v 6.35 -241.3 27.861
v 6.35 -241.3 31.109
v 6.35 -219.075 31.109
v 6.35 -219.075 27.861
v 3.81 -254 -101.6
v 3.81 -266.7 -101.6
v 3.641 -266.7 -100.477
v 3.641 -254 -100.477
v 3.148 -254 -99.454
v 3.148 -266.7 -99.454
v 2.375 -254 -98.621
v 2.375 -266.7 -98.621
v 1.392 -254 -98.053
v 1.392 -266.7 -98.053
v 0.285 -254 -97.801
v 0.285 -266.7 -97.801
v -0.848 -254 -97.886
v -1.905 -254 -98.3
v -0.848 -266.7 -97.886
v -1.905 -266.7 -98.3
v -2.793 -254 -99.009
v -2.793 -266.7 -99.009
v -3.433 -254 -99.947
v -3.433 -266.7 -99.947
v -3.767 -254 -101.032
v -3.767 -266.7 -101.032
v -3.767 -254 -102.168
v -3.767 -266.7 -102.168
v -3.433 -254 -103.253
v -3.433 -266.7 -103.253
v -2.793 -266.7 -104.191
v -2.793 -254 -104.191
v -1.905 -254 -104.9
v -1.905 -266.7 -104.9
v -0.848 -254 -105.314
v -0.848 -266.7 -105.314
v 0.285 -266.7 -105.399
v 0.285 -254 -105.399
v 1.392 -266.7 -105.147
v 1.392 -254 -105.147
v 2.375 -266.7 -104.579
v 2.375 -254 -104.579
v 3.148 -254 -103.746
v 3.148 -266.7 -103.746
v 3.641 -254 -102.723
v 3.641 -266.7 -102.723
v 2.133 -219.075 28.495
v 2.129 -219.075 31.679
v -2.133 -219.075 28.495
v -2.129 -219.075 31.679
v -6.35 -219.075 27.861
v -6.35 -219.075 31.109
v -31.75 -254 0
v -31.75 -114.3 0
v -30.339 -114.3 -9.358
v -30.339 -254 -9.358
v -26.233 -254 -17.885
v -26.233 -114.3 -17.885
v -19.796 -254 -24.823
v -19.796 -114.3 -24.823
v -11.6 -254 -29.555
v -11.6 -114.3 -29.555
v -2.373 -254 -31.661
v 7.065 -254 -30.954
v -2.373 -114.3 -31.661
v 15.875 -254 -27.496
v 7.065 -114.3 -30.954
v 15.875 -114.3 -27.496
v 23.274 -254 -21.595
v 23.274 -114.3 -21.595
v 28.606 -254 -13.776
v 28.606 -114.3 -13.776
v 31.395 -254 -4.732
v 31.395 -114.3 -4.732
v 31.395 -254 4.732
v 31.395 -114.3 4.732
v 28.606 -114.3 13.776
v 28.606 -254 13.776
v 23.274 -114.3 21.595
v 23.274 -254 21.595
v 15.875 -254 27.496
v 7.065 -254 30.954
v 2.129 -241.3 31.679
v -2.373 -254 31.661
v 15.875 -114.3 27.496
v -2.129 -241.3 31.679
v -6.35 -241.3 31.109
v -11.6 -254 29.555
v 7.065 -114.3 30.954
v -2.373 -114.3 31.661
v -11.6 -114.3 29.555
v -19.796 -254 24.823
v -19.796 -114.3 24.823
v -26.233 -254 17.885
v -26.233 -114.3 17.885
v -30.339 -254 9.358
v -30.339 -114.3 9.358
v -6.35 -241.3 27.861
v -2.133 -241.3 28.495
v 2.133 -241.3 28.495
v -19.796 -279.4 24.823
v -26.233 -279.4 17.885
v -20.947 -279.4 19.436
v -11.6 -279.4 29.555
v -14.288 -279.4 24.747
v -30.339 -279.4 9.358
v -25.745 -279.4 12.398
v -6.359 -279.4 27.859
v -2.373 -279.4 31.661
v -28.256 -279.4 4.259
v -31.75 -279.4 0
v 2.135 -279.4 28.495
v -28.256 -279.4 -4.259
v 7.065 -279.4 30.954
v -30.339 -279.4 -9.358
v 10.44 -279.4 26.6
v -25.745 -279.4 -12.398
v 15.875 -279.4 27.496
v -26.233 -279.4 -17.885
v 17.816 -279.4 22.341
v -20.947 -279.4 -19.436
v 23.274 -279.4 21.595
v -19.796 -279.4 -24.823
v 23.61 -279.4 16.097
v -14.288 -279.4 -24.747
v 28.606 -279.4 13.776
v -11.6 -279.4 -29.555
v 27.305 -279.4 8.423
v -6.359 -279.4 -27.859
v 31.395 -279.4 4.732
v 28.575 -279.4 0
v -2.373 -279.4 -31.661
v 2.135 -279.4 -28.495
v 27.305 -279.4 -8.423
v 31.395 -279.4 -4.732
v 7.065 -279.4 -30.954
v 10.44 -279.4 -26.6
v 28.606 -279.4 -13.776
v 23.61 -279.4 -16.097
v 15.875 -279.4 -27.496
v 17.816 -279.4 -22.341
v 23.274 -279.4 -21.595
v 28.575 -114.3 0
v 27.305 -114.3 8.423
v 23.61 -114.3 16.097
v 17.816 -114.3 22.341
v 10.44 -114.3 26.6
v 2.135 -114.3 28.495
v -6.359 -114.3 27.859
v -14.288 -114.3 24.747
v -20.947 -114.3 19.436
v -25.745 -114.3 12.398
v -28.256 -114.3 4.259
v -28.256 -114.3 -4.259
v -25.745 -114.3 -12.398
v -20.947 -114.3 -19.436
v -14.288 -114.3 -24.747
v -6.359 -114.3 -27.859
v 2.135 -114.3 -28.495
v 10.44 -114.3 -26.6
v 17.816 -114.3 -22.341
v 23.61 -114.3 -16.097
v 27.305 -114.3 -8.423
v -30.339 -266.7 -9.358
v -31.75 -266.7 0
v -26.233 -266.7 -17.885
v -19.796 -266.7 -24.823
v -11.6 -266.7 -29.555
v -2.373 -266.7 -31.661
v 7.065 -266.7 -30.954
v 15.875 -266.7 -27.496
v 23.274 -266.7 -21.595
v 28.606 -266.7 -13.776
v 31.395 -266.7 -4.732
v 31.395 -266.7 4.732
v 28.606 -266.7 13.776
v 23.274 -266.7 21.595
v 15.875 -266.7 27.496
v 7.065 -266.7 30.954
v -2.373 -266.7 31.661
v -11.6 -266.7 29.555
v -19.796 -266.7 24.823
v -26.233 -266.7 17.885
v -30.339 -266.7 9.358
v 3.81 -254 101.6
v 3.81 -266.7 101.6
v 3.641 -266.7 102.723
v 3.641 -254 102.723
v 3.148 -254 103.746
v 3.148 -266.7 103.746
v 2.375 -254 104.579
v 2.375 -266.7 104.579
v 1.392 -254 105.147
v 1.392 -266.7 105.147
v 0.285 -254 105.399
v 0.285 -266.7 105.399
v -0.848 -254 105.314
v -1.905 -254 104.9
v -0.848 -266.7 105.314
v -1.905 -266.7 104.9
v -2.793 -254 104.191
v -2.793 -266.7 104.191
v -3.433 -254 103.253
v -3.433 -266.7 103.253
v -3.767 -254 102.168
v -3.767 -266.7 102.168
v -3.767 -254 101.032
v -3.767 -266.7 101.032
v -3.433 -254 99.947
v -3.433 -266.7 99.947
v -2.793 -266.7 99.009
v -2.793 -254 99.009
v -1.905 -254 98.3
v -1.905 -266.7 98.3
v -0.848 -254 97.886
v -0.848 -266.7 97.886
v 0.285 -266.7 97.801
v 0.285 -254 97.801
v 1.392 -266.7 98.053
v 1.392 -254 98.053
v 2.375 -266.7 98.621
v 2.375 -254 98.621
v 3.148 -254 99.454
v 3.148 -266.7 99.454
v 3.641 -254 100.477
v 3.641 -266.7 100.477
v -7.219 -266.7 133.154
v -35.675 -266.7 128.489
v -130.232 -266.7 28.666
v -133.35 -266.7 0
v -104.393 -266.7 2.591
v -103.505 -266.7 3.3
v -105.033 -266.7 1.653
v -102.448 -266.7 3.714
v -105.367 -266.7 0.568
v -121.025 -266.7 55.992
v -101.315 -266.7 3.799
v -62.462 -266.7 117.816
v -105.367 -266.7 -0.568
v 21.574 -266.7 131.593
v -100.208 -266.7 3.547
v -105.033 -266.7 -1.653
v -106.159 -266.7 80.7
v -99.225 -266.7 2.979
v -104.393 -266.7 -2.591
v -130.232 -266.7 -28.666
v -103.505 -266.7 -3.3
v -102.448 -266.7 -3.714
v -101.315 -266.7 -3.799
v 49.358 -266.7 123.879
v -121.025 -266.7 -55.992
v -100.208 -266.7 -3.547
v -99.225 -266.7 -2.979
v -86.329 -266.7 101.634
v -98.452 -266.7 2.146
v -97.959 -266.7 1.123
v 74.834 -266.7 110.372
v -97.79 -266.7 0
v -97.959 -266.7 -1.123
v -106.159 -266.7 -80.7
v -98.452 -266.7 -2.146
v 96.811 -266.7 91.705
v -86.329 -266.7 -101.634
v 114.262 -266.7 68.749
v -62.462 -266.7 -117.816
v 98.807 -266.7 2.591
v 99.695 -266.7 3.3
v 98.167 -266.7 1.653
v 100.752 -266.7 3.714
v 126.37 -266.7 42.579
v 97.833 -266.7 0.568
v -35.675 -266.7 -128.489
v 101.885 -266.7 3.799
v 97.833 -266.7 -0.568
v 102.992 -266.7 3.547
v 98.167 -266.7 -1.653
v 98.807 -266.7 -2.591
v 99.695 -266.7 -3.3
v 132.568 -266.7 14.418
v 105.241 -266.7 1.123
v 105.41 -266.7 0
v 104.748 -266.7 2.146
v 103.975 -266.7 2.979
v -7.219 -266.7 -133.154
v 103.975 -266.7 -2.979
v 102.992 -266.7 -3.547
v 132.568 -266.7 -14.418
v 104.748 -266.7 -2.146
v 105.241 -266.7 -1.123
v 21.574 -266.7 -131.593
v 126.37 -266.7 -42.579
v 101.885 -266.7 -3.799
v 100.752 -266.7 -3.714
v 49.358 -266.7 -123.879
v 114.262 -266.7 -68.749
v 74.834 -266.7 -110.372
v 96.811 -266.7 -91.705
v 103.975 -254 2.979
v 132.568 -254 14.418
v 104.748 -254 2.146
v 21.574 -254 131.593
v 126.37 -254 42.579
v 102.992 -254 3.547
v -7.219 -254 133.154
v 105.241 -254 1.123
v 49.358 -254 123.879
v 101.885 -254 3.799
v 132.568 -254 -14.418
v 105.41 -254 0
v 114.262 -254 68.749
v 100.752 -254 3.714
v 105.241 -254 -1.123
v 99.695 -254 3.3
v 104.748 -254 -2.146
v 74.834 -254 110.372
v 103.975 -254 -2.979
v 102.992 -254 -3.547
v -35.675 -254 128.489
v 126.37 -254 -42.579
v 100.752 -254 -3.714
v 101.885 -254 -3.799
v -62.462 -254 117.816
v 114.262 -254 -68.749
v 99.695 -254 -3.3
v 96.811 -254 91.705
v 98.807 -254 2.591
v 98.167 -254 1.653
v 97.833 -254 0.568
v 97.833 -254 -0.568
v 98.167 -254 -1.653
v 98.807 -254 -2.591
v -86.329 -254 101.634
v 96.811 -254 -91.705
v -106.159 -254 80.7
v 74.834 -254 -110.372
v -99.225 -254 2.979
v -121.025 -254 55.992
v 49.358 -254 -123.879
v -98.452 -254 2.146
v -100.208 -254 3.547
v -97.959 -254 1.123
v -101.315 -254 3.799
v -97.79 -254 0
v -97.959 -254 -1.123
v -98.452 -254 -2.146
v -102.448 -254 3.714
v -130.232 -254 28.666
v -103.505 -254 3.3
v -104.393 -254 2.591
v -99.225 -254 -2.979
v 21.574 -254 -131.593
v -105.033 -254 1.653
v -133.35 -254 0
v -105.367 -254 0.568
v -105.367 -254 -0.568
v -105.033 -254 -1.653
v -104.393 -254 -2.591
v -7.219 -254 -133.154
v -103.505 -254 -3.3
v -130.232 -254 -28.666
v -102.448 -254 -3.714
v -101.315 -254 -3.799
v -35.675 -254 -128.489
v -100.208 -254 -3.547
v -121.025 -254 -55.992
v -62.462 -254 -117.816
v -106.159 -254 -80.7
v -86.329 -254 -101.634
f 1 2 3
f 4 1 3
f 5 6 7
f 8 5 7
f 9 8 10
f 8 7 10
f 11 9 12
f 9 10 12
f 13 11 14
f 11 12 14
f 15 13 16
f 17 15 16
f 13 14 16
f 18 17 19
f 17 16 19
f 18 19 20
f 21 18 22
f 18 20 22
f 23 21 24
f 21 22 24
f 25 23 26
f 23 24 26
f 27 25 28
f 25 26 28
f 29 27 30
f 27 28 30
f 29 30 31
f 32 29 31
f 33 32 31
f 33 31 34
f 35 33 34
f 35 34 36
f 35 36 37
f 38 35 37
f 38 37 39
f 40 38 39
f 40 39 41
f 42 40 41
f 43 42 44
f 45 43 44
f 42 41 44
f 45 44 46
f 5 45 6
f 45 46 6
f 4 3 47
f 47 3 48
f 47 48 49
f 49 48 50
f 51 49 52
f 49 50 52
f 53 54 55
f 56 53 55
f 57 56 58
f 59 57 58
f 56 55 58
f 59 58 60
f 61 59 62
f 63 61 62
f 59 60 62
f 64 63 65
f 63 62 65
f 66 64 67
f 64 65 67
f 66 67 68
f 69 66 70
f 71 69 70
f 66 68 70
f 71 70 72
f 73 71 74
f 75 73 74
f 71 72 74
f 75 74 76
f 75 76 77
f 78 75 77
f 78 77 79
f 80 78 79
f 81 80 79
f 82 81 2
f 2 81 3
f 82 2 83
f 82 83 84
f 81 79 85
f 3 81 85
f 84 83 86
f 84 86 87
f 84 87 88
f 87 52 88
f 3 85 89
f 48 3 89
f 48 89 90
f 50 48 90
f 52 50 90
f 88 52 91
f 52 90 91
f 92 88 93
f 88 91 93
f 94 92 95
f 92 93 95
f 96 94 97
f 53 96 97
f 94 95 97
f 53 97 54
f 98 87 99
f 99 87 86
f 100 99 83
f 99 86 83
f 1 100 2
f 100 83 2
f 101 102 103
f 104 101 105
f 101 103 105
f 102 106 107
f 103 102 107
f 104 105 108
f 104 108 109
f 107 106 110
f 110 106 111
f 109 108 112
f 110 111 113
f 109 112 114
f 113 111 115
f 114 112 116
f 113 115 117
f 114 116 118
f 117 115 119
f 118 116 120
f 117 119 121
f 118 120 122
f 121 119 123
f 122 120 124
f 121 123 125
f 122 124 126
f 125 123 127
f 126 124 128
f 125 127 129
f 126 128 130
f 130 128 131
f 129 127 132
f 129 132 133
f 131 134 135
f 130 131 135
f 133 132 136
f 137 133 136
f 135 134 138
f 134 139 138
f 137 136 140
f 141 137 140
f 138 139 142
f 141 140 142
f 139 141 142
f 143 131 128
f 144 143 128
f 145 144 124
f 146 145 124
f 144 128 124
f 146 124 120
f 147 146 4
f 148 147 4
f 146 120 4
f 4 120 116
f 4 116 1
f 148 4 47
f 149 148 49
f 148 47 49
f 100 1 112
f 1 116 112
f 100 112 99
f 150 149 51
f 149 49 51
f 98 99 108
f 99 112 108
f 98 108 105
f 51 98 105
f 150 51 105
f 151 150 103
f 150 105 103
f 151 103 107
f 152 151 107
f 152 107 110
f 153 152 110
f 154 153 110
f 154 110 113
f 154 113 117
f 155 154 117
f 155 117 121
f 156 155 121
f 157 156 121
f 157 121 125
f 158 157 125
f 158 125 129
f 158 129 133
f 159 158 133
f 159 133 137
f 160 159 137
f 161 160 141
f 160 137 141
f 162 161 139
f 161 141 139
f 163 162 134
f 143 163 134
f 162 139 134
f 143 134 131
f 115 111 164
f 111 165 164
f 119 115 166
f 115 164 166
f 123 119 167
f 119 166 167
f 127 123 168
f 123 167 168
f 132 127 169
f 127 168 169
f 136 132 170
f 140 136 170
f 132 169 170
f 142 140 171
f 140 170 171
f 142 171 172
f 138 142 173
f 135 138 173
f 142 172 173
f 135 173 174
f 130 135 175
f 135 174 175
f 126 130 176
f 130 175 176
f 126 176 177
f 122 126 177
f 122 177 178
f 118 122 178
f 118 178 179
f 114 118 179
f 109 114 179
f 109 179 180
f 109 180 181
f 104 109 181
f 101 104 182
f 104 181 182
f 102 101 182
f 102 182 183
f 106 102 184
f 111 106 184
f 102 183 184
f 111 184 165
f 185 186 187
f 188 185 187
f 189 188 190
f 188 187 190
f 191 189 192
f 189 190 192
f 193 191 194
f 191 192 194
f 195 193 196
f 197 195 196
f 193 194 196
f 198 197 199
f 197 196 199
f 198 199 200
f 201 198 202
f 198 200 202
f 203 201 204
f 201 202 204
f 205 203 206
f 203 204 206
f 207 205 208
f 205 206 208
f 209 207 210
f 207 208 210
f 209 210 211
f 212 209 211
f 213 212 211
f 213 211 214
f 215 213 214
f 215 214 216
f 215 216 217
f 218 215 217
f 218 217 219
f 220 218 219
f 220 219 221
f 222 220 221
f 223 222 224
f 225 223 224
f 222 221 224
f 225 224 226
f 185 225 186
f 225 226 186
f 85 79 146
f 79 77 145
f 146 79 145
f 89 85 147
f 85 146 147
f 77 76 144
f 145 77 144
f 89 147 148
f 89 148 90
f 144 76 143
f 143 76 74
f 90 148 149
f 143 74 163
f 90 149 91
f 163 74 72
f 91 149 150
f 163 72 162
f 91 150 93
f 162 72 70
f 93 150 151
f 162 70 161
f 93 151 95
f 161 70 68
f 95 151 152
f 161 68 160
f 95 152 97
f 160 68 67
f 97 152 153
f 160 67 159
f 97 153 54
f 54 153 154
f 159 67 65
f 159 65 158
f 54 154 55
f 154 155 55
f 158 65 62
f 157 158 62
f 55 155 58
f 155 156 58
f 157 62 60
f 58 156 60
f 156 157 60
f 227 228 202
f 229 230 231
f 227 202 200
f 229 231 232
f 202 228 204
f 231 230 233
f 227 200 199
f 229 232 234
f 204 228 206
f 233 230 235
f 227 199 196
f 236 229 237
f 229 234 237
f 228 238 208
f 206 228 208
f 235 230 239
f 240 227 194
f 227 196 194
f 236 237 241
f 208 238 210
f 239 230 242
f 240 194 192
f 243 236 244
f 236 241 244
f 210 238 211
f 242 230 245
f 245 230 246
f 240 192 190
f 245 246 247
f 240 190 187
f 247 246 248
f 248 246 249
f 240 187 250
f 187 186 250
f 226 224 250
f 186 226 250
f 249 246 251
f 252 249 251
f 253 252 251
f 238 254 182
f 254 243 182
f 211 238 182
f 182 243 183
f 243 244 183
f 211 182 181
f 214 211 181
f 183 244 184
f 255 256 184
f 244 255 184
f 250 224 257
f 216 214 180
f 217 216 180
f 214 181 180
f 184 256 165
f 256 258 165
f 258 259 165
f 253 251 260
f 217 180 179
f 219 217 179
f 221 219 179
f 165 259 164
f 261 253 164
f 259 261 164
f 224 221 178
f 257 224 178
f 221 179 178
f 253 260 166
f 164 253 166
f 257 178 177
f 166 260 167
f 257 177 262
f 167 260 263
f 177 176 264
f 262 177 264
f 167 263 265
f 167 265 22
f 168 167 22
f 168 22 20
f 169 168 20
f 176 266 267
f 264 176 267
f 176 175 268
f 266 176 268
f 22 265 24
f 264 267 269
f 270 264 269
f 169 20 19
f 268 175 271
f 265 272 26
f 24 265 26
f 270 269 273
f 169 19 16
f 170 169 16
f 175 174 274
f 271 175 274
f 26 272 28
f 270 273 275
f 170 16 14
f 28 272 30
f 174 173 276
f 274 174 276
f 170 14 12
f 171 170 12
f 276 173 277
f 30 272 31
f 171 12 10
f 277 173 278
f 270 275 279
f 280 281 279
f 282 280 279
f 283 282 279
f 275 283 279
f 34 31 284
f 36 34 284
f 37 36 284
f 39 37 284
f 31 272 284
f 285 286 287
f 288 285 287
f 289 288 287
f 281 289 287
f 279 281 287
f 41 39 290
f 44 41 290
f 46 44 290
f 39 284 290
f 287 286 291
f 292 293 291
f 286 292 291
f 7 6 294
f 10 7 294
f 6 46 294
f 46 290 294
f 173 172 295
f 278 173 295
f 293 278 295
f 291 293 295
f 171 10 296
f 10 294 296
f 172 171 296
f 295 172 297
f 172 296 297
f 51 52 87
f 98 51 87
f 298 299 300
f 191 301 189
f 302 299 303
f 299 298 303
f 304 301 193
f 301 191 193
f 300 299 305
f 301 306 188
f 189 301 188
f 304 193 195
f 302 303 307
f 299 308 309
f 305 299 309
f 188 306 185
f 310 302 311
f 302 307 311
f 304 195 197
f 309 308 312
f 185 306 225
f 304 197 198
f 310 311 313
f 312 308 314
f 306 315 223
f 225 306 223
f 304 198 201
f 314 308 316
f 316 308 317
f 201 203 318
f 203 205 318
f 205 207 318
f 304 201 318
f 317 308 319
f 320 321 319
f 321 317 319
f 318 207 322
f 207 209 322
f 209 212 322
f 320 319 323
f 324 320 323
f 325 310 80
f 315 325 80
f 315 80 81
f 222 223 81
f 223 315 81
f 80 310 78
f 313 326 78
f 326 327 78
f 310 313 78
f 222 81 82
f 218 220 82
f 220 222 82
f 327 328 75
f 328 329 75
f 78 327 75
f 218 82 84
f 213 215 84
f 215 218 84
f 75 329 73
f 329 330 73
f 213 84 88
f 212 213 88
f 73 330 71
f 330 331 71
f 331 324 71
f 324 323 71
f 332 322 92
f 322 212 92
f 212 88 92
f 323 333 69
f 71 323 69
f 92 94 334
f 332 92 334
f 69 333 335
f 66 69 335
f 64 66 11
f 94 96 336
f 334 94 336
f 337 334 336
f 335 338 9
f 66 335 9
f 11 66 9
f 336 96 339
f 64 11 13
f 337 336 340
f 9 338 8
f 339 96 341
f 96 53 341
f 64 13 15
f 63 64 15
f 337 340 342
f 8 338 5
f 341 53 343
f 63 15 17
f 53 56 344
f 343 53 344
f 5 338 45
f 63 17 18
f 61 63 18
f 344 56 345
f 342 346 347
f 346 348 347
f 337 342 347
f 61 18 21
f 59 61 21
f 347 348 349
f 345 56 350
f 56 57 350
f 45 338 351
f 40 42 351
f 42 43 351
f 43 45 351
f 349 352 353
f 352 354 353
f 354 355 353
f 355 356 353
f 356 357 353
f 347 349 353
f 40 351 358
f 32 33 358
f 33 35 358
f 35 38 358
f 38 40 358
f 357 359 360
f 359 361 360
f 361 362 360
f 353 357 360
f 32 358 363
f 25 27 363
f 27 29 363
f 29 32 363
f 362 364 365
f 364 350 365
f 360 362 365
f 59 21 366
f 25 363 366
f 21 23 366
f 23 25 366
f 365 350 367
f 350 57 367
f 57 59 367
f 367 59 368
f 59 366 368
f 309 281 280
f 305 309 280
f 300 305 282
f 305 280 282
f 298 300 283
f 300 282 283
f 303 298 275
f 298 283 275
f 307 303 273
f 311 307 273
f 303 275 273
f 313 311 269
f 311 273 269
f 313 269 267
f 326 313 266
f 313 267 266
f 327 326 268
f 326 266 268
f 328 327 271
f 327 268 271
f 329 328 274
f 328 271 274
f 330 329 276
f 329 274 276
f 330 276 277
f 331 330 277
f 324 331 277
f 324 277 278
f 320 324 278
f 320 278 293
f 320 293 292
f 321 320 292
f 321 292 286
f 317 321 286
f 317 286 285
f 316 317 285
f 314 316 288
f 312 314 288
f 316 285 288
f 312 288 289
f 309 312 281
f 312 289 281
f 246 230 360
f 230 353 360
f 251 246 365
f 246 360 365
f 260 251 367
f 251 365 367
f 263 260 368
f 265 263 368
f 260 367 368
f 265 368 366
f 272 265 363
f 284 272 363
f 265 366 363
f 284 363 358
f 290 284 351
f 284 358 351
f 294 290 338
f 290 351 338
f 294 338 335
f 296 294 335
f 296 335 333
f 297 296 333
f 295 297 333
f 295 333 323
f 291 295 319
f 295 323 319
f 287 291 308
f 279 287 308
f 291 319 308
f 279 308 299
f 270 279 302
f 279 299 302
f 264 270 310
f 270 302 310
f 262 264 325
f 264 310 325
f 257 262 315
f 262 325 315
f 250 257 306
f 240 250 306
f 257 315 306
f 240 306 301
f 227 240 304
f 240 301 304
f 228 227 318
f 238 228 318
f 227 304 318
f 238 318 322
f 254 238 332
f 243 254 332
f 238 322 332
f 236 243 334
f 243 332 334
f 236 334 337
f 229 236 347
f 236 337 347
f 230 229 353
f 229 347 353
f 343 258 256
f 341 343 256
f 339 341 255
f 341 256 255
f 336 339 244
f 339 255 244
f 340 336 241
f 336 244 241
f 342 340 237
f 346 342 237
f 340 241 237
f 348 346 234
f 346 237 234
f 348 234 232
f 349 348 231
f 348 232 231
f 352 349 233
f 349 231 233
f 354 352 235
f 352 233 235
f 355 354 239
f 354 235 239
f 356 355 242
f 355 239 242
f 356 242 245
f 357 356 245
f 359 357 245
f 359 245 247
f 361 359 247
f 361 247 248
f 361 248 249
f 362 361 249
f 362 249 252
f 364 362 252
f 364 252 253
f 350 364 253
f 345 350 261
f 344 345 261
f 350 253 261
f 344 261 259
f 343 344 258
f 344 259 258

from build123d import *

# Parameters (mm, degrees)
SKETCH2_R          = 28.575
CUT_EXTRUDE2_DEPTH = 228.6
CUT_EXTRUDE5_DEPTH = 8.89
SKETCH4_R          = 3.81
CUT_EXTRUDE4_DEPTH = 12.7


with BuildPart() as part:
    # Sketch1 → Revolve1 (revolve)
    with BuildSketch(Plane.XY, mode=Mode.PRIVATE) as revolve1_sk:
        Polygon((0, -114.3), (0, -279.4), (31.75, -279.4), (31.75, -266.7), (133.35, -266.7), (133.35, -254), (31.75, -254), (31.75, -114.3), align=None)
    revolve(revolve1_sk.sketch.rotate(Axis((0, 0, 0), (0, -1, 0)), 180), axis=Axis((0, 0, 0), (0, -1, 0)))

    # Sketch2 → Cut-Extrude2 (cut)
    with BuildSketch(Plane.XZ.offset(279.4)):
        Circle(SKETCH2_R)
    extrude(amount=-CUT_EXTRUDE2_DEPTH, mode=Mode.SUBTRACT)

    # Sketch3 → Cut-Extrude5 (cut)
    with BuildSketch(Plane.XY.offset(31.75)):
        Polygon((-6.35, -241.3), (6.35, -241.3), (6.35, -219.075), (0, -219.075), (-6.35, -219.075), align=None)
    extrude(amount=-CUT_EXTRUDE5_DEPTH, mode=Mode.SUBTRACT)

    # Sketch4 → Cut-Extrude4 (cut)
    with BuildSketch(Plane.XZ.offset(266.7)):
        with Locations((0, 101.6)):
            Circle(SKETCH4_R)
        with Locations((101.6, 0)):
            Circle(SKETCH4_R)
        with Locations((0, -101.6)):
            Circle(SKETCH4_R)
        with Locations((-101.6, 0)):
            Circle(SKETCH4_R)
    extrude(amount=-CUT_EXTRUDE4_DEPTH, mode=Mode.SUBTRACT)


solid = part.part
